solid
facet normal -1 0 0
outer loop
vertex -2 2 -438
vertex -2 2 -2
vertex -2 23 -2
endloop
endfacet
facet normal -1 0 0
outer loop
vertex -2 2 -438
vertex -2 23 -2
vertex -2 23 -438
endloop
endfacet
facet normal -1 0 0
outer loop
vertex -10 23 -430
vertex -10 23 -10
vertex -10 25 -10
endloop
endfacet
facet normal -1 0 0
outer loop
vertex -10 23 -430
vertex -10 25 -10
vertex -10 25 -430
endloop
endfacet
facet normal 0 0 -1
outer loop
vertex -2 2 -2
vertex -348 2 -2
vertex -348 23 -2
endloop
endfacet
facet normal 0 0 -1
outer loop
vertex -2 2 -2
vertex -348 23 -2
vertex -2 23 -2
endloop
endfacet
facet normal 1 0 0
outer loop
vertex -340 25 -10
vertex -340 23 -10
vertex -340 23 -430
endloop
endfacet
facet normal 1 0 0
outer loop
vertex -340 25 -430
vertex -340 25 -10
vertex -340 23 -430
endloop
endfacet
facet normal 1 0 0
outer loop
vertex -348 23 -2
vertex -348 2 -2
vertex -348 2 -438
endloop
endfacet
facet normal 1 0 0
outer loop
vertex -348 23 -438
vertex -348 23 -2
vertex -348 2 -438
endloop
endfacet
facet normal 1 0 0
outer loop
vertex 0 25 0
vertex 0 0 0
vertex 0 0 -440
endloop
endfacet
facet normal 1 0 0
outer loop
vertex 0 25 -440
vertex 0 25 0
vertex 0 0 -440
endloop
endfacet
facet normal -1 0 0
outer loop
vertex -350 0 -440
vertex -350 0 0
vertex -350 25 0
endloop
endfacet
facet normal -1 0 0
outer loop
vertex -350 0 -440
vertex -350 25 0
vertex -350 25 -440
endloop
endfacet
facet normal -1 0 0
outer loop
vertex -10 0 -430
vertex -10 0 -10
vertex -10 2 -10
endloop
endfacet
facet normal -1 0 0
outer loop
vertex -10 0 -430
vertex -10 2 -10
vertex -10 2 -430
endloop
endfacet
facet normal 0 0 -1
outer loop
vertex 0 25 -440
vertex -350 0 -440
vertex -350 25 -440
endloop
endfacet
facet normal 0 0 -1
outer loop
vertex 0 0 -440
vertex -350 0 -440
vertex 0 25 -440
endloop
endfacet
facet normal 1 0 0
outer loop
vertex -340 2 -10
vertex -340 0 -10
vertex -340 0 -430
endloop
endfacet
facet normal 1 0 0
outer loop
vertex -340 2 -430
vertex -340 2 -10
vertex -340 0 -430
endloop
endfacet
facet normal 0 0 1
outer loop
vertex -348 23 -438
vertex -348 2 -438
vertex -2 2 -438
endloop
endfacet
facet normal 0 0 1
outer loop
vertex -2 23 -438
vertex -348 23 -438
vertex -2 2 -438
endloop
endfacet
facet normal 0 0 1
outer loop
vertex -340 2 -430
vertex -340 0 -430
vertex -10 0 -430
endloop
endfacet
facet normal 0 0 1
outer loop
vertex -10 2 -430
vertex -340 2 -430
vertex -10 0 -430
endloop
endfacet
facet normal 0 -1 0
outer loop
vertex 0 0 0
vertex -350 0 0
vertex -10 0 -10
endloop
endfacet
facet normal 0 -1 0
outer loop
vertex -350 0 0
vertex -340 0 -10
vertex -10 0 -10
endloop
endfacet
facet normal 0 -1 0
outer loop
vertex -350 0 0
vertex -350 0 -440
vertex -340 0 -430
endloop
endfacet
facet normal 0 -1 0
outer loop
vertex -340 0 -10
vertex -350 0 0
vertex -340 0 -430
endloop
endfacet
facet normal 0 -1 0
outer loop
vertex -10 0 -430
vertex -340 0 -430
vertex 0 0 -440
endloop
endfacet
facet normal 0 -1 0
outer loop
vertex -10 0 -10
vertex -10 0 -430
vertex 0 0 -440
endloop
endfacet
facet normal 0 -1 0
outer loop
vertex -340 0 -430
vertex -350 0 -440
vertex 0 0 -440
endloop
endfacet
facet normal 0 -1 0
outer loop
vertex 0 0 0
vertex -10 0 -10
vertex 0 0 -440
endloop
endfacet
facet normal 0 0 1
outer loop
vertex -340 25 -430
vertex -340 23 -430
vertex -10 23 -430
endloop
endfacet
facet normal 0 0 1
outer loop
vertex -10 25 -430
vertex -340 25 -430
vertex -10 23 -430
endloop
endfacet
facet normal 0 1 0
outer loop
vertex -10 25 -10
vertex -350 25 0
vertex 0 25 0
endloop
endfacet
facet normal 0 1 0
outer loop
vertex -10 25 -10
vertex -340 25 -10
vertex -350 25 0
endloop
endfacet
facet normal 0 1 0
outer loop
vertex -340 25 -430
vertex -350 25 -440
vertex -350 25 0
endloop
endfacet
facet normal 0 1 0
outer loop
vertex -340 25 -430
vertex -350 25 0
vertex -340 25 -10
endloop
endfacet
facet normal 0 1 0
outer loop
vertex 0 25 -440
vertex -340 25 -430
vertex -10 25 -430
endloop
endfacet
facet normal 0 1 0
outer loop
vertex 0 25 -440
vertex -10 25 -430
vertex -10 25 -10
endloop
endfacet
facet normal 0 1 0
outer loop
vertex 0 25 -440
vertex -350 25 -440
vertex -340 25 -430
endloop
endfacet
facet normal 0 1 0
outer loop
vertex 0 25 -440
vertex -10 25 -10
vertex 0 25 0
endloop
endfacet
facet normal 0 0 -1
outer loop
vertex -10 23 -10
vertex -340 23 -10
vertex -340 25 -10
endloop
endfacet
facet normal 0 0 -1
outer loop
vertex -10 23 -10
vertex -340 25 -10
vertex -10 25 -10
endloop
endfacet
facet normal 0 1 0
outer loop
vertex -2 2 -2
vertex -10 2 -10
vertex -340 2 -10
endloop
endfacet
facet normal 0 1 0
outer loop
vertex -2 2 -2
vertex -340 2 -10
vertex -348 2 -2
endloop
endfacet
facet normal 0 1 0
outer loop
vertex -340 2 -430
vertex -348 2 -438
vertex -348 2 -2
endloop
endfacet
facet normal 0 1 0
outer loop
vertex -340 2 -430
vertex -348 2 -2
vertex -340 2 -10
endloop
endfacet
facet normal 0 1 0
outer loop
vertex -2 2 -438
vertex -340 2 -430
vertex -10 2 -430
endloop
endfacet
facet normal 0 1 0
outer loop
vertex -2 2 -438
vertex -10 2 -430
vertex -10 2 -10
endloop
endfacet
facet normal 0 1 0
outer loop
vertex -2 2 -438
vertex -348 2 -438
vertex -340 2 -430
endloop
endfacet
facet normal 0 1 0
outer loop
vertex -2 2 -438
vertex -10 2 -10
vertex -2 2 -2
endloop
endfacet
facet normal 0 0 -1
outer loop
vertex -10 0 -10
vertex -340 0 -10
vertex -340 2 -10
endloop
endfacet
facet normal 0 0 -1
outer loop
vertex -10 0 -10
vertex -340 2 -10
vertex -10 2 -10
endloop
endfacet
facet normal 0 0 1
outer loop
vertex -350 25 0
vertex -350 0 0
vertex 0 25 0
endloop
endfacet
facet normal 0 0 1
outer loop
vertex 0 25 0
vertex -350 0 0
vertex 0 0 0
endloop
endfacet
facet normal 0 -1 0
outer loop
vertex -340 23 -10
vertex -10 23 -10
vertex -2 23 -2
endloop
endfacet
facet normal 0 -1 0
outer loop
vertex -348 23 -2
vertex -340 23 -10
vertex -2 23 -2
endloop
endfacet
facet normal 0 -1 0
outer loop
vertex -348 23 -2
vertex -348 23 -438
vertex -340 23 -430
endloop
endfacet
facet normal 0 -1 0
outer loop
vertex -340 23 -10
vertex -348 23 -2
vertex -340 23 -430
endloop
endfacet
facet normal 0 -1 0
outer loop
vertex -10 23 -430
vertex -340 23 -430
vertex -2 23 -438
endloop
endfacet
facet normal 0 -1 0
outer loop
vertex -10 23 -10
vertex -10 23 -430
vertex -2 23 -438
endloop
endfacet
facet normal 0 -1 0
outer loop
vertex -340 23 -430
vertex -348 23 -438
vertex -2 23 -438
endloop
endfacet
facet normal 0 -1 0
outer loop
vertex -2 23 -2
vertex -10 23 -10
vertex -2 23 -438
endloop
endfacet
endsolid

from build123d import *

# Parameters (mm, degrees)
SKETCH1_W           = 350
SKETCH1_H           = 440
SKETCH1_W_2         = 330
SKETCH1_H_2         = 420
BOSS_EXTRUDE1_DEPTH = 25
SHELL1_T            = -2


with BuildPart() as part:
    # Sketch1 → Boss-Extrude1 (new body)
    with BuildSketch(Plane(origin=(0, 0, 0), x_dir=(1, 0, 0), z_dir=(0, 1, 0))):
        with Locations((-175, 220)):
            Rectangle(SKETCH1_W, SKETCH1_H)
        with Locations((-175, 220)):
            Rectangle(SKETCH1_W_2, SKETCH1_H_2, mode=Mode.SUBTRACT)
    extrude(amount=BOSS_EXTRUDE1_DEPTH)

    # Shell1
    shell1_openings = [part.faces().sort_by_distance(p)[0] for p in [
        (-175, 12.5, -10),
        (-10, 12.5, -220),
        (-175, 12.5, -430),
        (-340, 12.5, -220),
    ]]
    offset(amount=SHELL1_T, openings=shell1_openings, kind=Kind.INTERSECTION)


solid = part.part
